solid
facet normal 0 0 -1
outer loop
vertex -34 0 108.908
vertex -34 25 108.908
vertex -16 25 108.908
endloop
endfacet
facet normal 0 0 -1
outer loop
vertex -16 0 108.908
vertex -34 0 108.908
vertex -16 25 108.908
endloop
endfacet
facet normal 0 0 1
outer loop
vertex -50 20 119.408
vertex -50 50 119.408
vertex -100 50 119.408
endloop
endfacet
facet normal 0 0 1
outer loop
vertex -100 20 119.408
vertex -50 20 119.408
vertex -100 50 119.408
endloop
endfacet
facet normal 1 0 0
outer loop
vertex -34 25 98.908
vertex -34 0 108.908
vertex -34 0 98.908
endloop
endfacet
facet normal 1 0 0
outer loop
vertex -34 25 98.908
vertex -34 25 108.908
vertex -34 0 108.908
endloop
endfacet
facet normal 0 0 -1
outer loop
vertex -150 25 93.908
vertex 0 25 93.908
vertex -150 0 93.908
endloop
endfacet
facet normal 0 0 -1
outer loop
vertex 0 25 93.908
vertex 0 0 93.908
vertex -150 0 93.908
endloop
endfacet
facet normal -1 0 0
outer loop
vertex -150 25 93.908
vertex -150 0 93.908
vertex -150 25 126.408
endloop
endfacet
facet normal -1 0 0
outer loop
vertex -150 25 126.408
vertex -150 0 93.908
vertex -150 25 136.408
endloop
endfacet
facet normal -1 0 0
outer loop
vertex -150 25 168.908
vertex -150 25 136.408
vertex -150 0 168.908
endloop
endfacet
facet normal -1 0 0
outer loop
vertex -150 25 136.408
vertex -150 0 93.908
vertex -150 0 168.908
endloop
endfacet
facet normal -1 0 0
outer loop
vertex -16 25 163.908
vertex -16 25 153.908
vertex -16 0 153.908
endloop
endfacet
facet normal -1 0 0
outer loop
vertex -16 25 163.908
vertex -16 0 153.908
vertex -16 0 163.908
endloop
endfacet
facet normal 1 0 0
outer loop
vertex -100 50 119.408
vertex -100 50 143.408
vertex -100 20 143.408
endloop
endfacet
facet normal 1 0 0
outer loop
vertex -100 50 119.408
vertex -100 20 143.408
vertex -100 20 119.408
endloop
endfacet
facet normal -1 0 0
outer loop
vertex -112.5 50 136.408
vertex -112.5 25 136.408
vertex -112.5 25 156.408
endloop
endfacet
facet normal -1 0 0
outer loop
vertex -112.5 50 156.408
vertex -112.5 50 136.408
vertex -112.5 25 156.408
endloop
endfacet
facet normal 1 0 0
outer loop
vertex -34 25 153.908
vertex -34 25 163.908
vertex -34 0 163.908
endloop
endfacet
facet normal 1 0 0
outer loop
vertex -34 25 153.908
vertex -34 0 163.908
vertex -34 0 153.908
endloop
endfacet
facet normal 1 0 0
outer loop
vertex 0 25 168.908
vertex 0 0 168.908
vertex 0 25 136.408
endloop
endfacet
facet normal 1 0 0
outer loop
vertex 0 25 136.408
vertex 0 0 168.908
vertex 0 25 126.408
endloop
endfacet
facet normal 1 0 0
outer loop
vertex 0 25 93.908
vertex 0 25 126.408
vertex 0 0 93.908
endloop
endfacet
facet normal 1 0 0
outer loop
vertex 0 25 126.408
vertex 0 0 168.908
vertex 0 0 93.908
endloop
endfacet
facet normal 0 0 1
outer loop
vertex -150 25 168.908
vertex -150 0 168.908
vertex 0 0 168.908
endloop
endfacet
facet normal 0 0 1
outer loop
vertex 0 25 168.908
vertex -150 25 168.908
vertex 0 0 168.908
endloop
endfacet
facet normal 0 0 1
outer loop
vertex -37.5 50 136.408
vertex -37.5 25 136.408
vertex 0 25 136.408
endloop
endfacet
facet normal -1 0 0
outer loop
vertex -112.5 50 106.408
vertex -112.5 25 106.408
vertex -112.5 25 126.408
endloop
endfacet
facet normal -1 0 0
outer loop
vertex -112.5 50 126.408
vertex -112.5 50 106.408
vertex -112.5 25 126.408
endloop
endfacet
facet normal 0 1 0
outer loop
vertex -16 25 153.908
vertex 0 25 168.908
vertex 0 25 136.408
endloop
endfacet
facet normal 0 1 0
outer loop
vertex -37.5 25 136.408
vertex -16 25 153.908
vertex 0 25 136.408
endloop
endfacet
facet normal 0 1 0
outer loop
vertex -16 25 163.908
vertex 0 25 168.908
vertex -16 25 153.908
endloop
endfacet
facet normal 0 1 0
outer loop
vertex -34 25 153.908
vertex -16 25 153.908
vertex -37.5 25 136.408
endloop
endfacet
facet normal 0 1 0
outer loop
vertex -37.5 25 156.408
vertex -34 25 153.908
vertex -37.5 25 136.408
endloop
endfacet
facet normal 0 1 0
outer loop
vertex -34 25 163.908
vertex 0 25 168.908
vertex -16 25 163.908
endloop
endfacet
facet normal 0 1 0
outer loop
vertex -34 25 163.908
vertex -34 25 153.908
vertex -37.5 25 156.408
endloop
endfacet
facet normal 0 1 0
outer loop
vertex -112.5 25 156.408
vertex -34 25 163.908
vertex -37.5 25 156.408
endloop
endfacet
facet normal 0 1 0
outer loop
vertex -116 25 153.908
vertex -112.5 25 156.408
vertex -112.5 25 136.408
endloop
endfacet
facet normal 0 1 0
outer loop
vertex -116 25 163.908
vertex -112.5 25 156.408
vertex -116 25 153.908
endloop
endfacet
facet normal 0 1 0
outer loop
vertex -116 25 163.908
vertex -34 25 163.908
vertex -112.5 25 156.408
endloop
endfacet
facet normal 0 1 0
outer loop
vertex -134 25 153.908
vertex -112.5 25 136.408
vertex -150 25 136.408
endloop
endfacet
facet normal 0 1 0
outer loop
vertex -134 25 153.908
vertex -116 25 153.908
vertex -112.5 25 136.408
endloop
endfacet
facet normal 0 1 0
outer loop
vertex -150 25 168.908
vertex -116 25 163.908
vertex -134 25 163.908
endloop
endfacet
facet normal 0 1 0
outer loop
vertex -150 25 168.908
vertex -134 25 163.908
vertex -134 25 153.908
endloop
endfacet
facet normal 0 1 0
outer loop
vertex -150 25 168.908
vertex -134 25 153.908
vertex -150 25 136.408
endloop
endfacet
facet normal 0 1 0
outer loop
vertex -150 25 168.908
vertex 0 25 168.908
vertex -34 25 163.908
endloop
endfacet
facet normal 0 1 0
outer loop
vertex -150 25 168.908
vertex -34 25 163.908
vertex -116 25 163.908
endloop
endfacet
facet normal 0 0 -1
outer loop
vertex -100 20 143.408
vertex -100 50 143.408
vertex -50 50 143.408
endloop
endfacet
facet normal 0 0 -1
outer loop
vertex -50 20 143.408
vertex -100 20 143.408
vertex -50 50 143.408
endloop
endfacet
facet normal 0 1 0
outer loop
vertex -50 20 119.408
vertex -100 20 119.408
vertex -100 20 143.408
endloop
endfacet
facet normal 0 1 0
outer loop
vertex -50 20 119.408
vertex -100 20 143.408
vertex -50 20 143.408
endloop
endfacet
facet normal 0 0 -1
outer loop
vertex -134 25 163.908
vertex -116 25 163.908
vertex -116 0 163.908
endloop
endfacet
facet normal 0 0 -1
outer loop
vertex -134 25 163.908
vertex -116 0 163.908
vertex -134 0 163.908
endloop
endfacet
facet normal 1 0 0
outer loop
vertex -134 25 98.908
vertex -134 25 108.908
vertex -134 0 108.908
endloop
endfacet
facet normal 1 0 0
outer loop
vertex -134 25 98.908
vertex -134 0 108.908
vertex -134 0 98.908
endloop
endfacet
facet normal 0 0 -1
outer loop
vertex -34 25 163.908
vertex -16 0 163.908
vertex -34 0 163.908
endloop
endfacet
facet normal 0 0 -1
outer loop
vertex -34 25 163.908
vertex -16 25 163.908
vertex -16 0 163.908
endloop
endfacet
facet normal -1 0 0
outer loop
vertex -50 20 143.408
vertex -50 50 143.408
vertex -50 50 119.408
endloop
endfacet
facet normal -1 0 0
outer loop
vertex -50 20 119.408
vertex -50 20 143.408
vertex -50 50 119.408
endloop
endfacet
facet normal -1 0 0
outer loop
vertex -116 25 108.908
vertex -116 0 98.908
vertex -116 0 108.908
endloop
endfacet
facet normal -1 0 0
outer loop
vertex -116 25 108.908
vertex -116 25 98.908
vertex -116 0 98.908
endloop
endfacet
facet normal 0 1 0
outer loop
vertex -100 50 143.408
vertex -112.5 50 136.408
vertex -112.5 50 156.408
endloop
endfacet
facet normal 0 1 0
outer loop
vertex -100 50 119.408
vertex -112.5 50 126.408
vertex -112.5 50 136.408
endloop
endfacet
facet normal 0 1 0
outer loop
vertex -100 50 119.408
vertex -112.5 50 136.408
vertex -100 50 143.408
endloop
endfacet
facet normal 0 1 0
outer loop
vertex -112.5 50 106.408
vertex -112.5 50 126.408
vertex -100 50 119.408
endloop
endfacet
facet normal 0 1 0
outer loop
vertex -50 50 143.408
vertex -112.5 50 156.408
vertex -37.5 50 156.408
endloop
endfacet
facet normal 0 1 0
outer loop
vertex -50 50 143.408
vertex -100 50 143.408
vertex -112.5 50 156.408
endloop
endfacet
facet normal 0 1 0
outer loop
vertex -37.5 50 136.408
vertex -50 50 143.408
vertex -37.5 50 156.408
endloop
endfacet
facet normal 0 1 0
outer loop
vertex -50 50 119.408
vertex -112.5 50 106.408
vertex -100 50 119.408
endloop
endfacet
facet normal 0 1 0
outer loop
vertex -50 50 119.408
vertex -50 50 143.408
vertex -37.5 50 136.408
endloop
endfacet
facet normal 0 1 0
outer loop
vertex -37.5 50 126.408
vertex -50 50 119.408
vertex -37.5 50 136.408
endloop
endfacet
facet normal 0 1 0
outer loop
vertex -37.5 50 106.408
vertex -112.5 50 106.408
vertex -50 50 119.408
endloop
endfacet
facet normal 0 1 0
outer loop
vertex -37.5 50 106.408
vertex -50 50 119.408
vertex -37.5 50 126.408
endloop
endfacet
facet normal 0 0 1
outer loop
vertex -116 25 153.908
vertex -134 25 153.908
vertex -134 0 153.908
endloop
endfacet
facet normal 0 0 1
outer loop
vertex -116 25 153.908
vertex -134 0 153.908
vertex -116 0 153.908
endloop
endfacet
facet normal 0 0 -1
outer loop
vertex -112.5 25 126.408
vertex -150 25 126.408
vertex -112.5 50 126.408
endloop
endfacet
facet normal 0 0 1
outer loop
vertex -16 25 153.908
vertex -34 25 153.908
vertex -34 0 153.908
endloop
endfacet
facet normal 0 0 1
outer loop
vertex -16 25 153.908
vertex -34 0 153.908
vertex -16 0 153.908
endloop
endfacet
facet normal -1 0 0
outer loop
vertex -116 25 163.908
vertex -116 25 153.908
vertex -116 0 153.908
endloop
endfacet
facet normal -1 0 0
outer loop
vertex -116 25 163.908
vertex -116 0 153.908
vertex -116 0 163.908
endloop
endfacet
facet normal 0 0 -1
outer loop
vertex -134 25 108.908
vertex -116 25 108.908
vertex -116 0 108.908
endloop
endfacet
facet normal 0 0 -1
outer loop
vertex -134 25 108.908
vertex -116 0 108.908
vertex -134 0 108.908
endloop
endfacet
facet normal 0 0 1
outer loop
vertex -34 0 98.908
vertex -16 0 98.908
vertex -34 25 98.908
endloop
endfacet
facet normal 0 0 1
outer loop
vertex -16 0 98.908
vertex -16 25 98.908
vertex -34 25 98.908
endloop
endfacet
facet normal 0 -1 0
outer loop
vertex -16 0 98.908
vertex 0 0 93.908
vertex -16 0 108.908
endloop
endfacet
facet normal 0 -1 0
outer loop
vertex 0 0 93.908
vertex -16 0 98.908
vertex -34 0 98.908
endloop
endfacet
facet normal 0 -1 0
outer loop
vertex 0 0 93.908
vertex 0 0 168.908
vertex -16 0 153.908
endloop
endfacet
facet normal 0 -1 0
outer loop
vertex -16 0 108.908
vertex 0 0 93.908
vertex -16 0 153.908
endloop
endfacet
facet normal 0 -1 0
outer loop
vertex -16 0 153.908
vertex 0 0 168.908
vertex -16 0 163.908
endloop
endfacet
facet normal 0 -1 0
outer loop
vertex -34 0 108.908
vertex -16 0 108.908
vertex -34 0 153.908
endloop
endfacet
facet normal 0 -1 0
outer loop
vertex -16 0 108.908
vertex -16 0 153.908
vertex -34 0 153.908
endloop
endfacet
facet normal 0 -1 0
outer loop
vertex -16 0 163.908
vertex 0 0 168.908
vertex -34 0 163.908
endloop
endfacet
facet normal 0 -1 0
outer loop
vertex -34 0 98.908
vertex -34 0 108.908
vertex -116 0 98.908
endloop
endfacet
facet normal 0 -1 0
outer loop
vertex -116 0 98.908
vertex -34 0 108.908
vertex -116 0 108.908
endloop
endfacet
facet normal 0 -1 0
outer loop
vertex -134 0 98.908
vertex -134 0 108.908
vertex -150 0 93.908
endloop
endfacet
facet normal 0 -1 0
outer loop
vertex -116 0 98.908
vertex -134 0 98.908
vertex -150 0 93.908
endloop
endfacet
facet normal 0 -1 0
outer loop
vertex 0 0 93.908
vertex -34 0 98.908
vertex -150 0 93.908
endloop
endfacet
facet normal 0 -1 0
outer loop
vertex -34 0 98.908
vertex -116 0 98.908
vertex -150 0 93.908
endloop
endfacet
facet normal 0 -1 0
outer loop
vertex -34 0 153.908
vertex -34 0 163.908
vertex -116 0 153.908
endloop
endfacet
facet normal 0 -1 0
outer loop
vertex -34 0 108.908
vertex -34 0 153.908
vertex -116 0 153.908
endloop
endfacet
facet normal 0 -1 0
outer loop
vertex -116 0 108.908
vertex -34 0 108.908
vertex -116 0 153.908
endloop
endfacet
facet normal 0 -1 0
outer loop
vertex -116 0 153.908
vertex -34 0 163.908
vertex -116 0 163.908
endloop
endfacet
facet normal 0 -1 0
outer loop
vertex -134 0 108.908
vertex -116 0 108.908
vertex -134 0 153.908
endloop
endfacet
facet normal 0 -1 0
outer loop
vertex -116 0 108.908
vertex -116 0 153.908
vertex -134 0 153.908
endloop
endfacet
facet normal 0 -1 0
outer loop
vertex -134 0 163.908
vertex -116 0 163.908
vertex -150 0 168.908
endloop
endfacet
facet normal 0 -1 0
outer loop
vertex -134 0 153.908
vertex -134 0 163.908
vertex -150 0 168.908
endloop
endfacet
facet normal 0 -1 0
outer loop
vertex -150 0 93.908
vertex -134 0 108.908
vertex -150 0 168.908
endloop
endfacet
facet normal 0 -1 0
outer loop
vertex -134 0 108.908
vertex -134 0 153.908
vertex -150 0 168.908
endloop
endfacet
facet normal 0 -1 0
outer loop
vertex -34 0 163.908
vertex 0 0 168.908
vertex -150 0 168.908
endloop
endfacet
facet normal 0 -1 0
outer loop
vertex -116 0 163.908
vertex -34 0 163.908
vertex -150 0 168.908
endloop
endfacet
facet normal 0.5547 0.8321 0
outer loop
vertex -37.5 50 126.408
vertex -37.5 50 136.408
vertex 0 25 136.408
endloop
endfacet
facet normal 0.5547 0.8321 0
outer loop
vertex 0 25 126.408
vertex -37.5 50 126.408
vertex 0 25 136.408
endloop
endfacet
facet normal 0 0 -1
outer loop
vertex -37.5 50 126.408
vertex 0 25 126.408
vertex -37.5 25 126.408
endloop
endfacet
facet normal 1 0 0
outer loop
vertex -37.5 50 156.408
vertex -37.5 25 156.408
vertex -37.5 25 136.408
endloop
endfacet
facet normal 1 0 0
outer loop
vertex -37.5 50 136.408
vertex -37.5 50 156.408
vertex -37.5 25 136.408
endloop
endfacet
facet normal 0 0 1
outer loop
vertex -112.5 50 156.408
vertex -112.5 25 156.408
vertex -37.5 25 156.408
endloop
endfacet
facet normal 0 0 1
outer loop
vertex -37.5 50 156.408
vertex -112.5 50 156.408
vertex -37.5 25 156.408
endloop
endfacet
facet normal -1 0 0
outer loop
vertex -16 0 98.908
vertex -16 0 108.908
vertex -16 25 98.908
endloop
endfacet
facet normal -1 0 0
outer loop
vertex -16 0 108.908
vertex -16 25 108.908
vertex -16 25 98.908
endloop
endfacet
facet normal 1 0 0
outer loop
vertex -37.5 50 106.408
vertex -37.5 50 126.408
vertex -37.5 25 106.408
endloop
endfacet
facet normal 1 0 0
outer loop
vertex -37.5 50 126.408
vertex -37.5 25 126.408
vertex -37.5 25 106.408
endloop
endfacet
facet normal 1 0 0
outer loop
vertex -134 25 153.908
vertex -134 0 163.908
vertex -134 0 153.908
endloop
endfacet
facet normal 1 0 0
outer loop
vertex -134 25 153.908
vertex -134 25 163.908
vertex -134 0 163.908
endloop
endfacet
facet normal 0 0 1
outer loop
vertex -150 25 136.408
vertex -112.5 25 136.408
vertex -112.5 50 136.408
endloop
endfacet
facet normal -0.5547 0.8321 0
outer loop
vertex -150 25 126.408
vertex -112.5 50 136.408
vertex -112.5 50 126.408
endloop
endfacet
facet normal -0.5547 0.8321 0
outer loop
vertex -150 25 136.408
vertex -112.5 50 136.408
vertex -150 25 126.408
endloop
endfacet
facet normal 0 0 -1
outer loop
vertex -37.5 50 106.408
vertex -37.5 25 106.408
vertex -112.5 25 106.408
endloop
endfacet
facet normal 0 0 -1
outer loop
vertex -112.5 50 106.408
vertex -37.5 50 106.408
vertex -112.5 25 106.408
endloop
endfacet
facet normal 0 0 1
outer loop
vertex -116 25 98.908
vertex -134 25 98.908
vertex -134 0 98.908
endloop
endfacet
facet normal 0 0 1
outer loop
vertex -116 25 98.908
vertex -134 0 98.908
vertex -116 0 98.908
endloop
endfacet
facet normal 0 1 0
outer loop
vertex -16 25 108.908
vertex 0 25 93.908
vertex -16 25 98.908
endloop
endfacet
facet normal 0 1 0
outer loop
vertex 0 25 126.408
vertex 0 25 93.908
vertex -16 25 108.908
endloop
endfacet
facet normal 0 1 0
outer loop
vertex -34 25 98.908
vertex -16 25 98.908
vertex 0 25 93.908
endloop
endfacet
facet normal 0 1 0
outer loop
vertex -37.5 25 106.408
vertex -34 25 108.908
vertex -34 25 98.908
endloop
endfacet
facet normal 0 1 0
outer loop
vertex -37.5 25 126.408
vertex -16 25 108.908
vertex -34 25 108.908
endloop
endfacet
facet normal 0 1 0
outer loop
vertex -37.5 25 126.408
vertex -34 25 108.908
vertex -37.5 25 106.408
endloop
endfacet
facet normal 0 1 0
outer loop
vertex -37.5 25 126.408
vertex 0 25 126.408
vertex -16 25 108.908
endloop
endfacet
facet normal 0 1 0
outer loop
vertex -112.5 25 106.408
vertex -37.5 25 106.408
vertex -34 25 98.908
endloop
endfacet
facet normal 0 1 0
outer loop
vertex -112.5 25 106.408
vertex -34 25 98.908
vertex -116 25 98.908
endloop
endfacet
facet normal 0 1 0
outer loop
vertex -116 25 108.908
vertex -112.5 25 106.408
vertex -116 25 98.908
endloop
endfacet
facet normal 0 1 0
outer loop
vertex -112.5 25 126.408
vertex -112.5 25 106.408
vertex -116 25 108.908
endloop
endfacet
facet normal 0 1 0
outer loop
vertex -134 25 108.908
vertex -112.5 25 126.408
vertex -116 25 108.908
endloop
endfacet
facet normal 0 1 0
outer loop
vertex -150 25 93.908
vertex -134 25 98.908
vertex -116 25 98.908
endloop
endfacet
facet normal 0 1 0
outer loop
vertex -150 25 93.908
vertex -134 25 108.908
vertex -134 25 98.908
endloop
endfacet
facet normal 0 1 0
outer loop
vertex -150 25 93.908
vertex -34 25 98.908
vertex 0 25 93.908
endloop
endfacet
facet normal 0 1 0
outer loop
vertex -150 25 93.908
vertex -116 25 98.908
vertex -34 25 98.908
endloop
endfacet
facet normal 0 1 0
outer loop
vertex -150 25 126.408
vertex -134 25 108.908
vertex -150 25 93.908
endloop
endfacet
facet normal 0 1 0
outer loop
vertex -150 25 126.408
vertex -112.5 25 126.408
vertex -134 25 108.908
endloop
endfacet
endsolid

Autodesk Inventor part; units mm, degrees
ref_plane "YZ Plane" through (0, 0, 0) normal (1, 0, 0) x (0, 1, 0)
ref_plane "XZ Plane" through (0, 0, 0) normal (0, 1, 0) x (-1, 0, 0)
ref_plane "XY Plane" through (0, 0, 0) normal (0, 0, 1) x (1, 0, 0)
sketch "Sketch1" plane through (0, 0, 0) normal (0, 1, 0) x (-1, 0, 0)
  line L0 (0, 93.9079) -> (150, 93.9079)
  line L1 (150, 93.9079) -> (150, 168.9079)
  line L2 (150, 168.9079) -> (0, 168.9079)
  line L3 (0, 168.9079) -> (0, 93.9079)
  point P0 (0, 0)
  dimension "d0" = 150
  dimension "d1" = 75
extrude "Extrusion1" add sketch "Sketch1" along normal blind 25
sketch "Sketch2" plane through (0, 25, 0) normal (0, 1, 0) x (1, 0, 0)
  line L0 (0, -168.9079) -> (-75, -168.9079)
  line L1 (-75, -156.4079) -> (-112.5, -156.4079)
  line L2 (-75, -156.4079) -> (-37.5, -156.4079)
  line L3 (-37.5, -156.4079) -> (-37.5, -106.4079)
  line L4 (-37.5, -106.4079) -> (-112.5, -106.4079)
  line L5 (-112.5, -106.4079) -> (-112.5, -156.4079)
  point P0 (0, 0)
  dimension "d8" = 37.5
  dimension "d9" = 37.5
  dimension "d10" = 50
  dimension "d11" = 75
extrude "Extrusion2" add sketch "Sketch2" along normal blind 25
sketch "Sketch3" plane through (0, 50, 0) normal (0, 1, 0) x (1, 0, 0)
  line L0 (-112.5, -156.4079) -> (-37.5, -156.4079) projected
  line L1 (-37.5, -156.4079) -> (-37.5, -131.4079)
  line L2 (-75, -143.4079) -> (-100, -143.4079)
  line L3 (-75, -143.4079) -> (-50, -143.4079)
  line L4 (-50, -143.4079) -> (-50, -119.4079)
  line L5 (-50, -119.4079) -> (-100, -119.4079)
  line L6 (-100, -143.4079) -> (-100, -119.4079)
  point P0 (0, 0)
  dimension "d18" = 25
  dimension "d19" = 25
  dimension "d20" = 24
  dimension "d21" = 50
extrude "Extrusion3" cut sketch "Sketch3" against normal blind 30
sketch "Sketch4" plane through (0, 25, 0) normal (0, 1, 0) x (1, 0, 0)
  line L0 (-37.5, -106.4079) -> (-37.5, -156.4079) projected
  line L1 (-37.5, -156.4079) -> (-37.5, -131.4079)
  line L2 (-37.5, -131.4079) -> (-37.5, -126.4079)
  line L3 (-37.5, -131.4079) -> (-37.5, -136.4079)
  line L4 (-37.5, -136.4079) -> (0, -136.4079)
  line L5 (0, -168.9079) -> (0, -93.9079) projected
  line L6 (0, -136.4079) -> (0, -126.4079)
  line L7 (0, -126.4079) -> (-37.5, -126.4079)
  line L8 (-112.5, -156.4079) -> (-112.5, -106.4079) projected
  line L9 (-112.5, -106.4079) -> (-112.5, -131.4079)
  line L10 (-37.5, -156.4079) -> (-112.5, -156.4079) projected
  line L11 (-112.5, -131.4079) -> (-112.5, -136.4079)
  line L12 (-112.5, -131.4079) -> (-112.5, -126.4079)
  line L13 (-112.5, -136.4079) -> (-150, -136.4079)
  line L14 (-150, -93.9079) -> (-150, -168.9079) projected
  line L15 (-150, -136.4079) -> (-150, -126.4079)
  line L16 (-150, -126.4079) -> (-112.5, -126.4079)
  point P0 (0, 0)
  dimension "d25" = 5
  dimension "d26" = 5
  dimension "d27" = 10
  dimension "d29" = 5
  dimension "d30" = 5
  dimension "d31" = 10
extrude "Extrusion4" add sketch "Sketch4" along normal blind 25
sketch "Sketch5" plane through (-150, 25, 136.4079) normal (0, 0, 1) x (1, 0, 0)
  line L0 (37.5, 25) -> (0, 0)
  line L1 (0, 25) -> (37.5, 25) projected
  line L2 (0, 0) -> (0, 25)
  line L3 (0, 25) -> (37.5, 25)
  point P0 (150, -25)
extrude "Extrusion5" cut sketch "Sketch5" against normal blind 25
sketch "Sketch6" plane through (-37.5, 25, 136.4079) normal (0, 0, 1) x (1, 0, 0)
  line L0 (0, 25) -> (37.5, 25) projected
  line L1 (37.5, 0) -> (0, 0) projected
  line L2 (0, 25) -> (37.5, 0)
  line L3 (37.5, 0) -> (37.5, 25) projected
  line L4 (37.5, 0) -> (37.5, 25)
  line L5 (37.5, 25) -> (0, 25)
  point P0 (37.5, -25)
extrude "Extrusion6" cut sketch "Sketch6" against normal blind 25
sketch "Sketch7" plane through (0, 25, 0) normal (0, 1, 0) x (1, 0, 0)
  line L0 (0, -126.4079) -> (0, -93.9079) projected
  line L1 (0, -93.9079) -> (-25, -93.9079)
  line L2 (-34, -103.9079) -> (-34, -98.9079)
  line L3 (-34, -103.9079) -> (-34, -108.9079)
  line L4 (-34, -108.9079) -> (-16, -108.9079)
  line L5 (-16, -108.9079) -> (-16, -98.9079)
  line L6 (-16, -98.9079) -> (-34, -98.9079)
  line L7 (-150, -93.9079) -> (-116, -93.9079)
  line L8 (-116, -98.9079) -> (-116, -108.9079)
  line L9 (-116, -108.9079) -> (-134, -108.9079)
  line L10 (-134, -108.9079) -> (-134, -98.9079)
  line L11 (-134, -98.9079) -> (-116, -98.9079)
  line L12 (-116, -153.9079) -> (-116, -163.9079)
  line L13 (-116, -163.9079) -> (-134, -163.9079)
  line L14 (-134, -163.9079) -> (-134, -153.9079)
  line L15 (-134, -153.9079) -> (-116, -153.9079)
  line L16 (-150, -168.9079) -> (0, -168.9079) projected
  line L17 (-150, -136.4079) -> (-150, -168.9079) projected
  line L18 (-16, -153.9079) -> (-16, -163.9079)
  line L19 (-16, -163.9079) -> (-34, -163.9079)
  line L20 (-34, -163.9079) -> (-34, -153.9079)
  line L21 (-34, -153.9079) -> (-16, -153.9079)
  line L22 (0, -168.9079) -> (0, -136.4079) projected
  point P0 (0, 0)
  dimension "d44" = 5
  dimension "d45" = 5
  dimension "d46" = 18
  dimension "d47" = 10
  dimension "d50" = 10
  dimension "d51" = 18
  dimension "d52" = 10
  dimension "d53" = 10
  dimension "d54" = 18
  dimension "d55" = 10
  dimension "d56" = 5
  dimension "d57" = 16
  dimension "d58" = 10
  dimension "d59" = 18
  dimension "d60" = 10
  dimension "d61" = 16
  dimension "d62" = 5
extrude "Extrusion7" cut sketch "Sketch7" against normal blind 25
properties part number "6 - Part 3"
